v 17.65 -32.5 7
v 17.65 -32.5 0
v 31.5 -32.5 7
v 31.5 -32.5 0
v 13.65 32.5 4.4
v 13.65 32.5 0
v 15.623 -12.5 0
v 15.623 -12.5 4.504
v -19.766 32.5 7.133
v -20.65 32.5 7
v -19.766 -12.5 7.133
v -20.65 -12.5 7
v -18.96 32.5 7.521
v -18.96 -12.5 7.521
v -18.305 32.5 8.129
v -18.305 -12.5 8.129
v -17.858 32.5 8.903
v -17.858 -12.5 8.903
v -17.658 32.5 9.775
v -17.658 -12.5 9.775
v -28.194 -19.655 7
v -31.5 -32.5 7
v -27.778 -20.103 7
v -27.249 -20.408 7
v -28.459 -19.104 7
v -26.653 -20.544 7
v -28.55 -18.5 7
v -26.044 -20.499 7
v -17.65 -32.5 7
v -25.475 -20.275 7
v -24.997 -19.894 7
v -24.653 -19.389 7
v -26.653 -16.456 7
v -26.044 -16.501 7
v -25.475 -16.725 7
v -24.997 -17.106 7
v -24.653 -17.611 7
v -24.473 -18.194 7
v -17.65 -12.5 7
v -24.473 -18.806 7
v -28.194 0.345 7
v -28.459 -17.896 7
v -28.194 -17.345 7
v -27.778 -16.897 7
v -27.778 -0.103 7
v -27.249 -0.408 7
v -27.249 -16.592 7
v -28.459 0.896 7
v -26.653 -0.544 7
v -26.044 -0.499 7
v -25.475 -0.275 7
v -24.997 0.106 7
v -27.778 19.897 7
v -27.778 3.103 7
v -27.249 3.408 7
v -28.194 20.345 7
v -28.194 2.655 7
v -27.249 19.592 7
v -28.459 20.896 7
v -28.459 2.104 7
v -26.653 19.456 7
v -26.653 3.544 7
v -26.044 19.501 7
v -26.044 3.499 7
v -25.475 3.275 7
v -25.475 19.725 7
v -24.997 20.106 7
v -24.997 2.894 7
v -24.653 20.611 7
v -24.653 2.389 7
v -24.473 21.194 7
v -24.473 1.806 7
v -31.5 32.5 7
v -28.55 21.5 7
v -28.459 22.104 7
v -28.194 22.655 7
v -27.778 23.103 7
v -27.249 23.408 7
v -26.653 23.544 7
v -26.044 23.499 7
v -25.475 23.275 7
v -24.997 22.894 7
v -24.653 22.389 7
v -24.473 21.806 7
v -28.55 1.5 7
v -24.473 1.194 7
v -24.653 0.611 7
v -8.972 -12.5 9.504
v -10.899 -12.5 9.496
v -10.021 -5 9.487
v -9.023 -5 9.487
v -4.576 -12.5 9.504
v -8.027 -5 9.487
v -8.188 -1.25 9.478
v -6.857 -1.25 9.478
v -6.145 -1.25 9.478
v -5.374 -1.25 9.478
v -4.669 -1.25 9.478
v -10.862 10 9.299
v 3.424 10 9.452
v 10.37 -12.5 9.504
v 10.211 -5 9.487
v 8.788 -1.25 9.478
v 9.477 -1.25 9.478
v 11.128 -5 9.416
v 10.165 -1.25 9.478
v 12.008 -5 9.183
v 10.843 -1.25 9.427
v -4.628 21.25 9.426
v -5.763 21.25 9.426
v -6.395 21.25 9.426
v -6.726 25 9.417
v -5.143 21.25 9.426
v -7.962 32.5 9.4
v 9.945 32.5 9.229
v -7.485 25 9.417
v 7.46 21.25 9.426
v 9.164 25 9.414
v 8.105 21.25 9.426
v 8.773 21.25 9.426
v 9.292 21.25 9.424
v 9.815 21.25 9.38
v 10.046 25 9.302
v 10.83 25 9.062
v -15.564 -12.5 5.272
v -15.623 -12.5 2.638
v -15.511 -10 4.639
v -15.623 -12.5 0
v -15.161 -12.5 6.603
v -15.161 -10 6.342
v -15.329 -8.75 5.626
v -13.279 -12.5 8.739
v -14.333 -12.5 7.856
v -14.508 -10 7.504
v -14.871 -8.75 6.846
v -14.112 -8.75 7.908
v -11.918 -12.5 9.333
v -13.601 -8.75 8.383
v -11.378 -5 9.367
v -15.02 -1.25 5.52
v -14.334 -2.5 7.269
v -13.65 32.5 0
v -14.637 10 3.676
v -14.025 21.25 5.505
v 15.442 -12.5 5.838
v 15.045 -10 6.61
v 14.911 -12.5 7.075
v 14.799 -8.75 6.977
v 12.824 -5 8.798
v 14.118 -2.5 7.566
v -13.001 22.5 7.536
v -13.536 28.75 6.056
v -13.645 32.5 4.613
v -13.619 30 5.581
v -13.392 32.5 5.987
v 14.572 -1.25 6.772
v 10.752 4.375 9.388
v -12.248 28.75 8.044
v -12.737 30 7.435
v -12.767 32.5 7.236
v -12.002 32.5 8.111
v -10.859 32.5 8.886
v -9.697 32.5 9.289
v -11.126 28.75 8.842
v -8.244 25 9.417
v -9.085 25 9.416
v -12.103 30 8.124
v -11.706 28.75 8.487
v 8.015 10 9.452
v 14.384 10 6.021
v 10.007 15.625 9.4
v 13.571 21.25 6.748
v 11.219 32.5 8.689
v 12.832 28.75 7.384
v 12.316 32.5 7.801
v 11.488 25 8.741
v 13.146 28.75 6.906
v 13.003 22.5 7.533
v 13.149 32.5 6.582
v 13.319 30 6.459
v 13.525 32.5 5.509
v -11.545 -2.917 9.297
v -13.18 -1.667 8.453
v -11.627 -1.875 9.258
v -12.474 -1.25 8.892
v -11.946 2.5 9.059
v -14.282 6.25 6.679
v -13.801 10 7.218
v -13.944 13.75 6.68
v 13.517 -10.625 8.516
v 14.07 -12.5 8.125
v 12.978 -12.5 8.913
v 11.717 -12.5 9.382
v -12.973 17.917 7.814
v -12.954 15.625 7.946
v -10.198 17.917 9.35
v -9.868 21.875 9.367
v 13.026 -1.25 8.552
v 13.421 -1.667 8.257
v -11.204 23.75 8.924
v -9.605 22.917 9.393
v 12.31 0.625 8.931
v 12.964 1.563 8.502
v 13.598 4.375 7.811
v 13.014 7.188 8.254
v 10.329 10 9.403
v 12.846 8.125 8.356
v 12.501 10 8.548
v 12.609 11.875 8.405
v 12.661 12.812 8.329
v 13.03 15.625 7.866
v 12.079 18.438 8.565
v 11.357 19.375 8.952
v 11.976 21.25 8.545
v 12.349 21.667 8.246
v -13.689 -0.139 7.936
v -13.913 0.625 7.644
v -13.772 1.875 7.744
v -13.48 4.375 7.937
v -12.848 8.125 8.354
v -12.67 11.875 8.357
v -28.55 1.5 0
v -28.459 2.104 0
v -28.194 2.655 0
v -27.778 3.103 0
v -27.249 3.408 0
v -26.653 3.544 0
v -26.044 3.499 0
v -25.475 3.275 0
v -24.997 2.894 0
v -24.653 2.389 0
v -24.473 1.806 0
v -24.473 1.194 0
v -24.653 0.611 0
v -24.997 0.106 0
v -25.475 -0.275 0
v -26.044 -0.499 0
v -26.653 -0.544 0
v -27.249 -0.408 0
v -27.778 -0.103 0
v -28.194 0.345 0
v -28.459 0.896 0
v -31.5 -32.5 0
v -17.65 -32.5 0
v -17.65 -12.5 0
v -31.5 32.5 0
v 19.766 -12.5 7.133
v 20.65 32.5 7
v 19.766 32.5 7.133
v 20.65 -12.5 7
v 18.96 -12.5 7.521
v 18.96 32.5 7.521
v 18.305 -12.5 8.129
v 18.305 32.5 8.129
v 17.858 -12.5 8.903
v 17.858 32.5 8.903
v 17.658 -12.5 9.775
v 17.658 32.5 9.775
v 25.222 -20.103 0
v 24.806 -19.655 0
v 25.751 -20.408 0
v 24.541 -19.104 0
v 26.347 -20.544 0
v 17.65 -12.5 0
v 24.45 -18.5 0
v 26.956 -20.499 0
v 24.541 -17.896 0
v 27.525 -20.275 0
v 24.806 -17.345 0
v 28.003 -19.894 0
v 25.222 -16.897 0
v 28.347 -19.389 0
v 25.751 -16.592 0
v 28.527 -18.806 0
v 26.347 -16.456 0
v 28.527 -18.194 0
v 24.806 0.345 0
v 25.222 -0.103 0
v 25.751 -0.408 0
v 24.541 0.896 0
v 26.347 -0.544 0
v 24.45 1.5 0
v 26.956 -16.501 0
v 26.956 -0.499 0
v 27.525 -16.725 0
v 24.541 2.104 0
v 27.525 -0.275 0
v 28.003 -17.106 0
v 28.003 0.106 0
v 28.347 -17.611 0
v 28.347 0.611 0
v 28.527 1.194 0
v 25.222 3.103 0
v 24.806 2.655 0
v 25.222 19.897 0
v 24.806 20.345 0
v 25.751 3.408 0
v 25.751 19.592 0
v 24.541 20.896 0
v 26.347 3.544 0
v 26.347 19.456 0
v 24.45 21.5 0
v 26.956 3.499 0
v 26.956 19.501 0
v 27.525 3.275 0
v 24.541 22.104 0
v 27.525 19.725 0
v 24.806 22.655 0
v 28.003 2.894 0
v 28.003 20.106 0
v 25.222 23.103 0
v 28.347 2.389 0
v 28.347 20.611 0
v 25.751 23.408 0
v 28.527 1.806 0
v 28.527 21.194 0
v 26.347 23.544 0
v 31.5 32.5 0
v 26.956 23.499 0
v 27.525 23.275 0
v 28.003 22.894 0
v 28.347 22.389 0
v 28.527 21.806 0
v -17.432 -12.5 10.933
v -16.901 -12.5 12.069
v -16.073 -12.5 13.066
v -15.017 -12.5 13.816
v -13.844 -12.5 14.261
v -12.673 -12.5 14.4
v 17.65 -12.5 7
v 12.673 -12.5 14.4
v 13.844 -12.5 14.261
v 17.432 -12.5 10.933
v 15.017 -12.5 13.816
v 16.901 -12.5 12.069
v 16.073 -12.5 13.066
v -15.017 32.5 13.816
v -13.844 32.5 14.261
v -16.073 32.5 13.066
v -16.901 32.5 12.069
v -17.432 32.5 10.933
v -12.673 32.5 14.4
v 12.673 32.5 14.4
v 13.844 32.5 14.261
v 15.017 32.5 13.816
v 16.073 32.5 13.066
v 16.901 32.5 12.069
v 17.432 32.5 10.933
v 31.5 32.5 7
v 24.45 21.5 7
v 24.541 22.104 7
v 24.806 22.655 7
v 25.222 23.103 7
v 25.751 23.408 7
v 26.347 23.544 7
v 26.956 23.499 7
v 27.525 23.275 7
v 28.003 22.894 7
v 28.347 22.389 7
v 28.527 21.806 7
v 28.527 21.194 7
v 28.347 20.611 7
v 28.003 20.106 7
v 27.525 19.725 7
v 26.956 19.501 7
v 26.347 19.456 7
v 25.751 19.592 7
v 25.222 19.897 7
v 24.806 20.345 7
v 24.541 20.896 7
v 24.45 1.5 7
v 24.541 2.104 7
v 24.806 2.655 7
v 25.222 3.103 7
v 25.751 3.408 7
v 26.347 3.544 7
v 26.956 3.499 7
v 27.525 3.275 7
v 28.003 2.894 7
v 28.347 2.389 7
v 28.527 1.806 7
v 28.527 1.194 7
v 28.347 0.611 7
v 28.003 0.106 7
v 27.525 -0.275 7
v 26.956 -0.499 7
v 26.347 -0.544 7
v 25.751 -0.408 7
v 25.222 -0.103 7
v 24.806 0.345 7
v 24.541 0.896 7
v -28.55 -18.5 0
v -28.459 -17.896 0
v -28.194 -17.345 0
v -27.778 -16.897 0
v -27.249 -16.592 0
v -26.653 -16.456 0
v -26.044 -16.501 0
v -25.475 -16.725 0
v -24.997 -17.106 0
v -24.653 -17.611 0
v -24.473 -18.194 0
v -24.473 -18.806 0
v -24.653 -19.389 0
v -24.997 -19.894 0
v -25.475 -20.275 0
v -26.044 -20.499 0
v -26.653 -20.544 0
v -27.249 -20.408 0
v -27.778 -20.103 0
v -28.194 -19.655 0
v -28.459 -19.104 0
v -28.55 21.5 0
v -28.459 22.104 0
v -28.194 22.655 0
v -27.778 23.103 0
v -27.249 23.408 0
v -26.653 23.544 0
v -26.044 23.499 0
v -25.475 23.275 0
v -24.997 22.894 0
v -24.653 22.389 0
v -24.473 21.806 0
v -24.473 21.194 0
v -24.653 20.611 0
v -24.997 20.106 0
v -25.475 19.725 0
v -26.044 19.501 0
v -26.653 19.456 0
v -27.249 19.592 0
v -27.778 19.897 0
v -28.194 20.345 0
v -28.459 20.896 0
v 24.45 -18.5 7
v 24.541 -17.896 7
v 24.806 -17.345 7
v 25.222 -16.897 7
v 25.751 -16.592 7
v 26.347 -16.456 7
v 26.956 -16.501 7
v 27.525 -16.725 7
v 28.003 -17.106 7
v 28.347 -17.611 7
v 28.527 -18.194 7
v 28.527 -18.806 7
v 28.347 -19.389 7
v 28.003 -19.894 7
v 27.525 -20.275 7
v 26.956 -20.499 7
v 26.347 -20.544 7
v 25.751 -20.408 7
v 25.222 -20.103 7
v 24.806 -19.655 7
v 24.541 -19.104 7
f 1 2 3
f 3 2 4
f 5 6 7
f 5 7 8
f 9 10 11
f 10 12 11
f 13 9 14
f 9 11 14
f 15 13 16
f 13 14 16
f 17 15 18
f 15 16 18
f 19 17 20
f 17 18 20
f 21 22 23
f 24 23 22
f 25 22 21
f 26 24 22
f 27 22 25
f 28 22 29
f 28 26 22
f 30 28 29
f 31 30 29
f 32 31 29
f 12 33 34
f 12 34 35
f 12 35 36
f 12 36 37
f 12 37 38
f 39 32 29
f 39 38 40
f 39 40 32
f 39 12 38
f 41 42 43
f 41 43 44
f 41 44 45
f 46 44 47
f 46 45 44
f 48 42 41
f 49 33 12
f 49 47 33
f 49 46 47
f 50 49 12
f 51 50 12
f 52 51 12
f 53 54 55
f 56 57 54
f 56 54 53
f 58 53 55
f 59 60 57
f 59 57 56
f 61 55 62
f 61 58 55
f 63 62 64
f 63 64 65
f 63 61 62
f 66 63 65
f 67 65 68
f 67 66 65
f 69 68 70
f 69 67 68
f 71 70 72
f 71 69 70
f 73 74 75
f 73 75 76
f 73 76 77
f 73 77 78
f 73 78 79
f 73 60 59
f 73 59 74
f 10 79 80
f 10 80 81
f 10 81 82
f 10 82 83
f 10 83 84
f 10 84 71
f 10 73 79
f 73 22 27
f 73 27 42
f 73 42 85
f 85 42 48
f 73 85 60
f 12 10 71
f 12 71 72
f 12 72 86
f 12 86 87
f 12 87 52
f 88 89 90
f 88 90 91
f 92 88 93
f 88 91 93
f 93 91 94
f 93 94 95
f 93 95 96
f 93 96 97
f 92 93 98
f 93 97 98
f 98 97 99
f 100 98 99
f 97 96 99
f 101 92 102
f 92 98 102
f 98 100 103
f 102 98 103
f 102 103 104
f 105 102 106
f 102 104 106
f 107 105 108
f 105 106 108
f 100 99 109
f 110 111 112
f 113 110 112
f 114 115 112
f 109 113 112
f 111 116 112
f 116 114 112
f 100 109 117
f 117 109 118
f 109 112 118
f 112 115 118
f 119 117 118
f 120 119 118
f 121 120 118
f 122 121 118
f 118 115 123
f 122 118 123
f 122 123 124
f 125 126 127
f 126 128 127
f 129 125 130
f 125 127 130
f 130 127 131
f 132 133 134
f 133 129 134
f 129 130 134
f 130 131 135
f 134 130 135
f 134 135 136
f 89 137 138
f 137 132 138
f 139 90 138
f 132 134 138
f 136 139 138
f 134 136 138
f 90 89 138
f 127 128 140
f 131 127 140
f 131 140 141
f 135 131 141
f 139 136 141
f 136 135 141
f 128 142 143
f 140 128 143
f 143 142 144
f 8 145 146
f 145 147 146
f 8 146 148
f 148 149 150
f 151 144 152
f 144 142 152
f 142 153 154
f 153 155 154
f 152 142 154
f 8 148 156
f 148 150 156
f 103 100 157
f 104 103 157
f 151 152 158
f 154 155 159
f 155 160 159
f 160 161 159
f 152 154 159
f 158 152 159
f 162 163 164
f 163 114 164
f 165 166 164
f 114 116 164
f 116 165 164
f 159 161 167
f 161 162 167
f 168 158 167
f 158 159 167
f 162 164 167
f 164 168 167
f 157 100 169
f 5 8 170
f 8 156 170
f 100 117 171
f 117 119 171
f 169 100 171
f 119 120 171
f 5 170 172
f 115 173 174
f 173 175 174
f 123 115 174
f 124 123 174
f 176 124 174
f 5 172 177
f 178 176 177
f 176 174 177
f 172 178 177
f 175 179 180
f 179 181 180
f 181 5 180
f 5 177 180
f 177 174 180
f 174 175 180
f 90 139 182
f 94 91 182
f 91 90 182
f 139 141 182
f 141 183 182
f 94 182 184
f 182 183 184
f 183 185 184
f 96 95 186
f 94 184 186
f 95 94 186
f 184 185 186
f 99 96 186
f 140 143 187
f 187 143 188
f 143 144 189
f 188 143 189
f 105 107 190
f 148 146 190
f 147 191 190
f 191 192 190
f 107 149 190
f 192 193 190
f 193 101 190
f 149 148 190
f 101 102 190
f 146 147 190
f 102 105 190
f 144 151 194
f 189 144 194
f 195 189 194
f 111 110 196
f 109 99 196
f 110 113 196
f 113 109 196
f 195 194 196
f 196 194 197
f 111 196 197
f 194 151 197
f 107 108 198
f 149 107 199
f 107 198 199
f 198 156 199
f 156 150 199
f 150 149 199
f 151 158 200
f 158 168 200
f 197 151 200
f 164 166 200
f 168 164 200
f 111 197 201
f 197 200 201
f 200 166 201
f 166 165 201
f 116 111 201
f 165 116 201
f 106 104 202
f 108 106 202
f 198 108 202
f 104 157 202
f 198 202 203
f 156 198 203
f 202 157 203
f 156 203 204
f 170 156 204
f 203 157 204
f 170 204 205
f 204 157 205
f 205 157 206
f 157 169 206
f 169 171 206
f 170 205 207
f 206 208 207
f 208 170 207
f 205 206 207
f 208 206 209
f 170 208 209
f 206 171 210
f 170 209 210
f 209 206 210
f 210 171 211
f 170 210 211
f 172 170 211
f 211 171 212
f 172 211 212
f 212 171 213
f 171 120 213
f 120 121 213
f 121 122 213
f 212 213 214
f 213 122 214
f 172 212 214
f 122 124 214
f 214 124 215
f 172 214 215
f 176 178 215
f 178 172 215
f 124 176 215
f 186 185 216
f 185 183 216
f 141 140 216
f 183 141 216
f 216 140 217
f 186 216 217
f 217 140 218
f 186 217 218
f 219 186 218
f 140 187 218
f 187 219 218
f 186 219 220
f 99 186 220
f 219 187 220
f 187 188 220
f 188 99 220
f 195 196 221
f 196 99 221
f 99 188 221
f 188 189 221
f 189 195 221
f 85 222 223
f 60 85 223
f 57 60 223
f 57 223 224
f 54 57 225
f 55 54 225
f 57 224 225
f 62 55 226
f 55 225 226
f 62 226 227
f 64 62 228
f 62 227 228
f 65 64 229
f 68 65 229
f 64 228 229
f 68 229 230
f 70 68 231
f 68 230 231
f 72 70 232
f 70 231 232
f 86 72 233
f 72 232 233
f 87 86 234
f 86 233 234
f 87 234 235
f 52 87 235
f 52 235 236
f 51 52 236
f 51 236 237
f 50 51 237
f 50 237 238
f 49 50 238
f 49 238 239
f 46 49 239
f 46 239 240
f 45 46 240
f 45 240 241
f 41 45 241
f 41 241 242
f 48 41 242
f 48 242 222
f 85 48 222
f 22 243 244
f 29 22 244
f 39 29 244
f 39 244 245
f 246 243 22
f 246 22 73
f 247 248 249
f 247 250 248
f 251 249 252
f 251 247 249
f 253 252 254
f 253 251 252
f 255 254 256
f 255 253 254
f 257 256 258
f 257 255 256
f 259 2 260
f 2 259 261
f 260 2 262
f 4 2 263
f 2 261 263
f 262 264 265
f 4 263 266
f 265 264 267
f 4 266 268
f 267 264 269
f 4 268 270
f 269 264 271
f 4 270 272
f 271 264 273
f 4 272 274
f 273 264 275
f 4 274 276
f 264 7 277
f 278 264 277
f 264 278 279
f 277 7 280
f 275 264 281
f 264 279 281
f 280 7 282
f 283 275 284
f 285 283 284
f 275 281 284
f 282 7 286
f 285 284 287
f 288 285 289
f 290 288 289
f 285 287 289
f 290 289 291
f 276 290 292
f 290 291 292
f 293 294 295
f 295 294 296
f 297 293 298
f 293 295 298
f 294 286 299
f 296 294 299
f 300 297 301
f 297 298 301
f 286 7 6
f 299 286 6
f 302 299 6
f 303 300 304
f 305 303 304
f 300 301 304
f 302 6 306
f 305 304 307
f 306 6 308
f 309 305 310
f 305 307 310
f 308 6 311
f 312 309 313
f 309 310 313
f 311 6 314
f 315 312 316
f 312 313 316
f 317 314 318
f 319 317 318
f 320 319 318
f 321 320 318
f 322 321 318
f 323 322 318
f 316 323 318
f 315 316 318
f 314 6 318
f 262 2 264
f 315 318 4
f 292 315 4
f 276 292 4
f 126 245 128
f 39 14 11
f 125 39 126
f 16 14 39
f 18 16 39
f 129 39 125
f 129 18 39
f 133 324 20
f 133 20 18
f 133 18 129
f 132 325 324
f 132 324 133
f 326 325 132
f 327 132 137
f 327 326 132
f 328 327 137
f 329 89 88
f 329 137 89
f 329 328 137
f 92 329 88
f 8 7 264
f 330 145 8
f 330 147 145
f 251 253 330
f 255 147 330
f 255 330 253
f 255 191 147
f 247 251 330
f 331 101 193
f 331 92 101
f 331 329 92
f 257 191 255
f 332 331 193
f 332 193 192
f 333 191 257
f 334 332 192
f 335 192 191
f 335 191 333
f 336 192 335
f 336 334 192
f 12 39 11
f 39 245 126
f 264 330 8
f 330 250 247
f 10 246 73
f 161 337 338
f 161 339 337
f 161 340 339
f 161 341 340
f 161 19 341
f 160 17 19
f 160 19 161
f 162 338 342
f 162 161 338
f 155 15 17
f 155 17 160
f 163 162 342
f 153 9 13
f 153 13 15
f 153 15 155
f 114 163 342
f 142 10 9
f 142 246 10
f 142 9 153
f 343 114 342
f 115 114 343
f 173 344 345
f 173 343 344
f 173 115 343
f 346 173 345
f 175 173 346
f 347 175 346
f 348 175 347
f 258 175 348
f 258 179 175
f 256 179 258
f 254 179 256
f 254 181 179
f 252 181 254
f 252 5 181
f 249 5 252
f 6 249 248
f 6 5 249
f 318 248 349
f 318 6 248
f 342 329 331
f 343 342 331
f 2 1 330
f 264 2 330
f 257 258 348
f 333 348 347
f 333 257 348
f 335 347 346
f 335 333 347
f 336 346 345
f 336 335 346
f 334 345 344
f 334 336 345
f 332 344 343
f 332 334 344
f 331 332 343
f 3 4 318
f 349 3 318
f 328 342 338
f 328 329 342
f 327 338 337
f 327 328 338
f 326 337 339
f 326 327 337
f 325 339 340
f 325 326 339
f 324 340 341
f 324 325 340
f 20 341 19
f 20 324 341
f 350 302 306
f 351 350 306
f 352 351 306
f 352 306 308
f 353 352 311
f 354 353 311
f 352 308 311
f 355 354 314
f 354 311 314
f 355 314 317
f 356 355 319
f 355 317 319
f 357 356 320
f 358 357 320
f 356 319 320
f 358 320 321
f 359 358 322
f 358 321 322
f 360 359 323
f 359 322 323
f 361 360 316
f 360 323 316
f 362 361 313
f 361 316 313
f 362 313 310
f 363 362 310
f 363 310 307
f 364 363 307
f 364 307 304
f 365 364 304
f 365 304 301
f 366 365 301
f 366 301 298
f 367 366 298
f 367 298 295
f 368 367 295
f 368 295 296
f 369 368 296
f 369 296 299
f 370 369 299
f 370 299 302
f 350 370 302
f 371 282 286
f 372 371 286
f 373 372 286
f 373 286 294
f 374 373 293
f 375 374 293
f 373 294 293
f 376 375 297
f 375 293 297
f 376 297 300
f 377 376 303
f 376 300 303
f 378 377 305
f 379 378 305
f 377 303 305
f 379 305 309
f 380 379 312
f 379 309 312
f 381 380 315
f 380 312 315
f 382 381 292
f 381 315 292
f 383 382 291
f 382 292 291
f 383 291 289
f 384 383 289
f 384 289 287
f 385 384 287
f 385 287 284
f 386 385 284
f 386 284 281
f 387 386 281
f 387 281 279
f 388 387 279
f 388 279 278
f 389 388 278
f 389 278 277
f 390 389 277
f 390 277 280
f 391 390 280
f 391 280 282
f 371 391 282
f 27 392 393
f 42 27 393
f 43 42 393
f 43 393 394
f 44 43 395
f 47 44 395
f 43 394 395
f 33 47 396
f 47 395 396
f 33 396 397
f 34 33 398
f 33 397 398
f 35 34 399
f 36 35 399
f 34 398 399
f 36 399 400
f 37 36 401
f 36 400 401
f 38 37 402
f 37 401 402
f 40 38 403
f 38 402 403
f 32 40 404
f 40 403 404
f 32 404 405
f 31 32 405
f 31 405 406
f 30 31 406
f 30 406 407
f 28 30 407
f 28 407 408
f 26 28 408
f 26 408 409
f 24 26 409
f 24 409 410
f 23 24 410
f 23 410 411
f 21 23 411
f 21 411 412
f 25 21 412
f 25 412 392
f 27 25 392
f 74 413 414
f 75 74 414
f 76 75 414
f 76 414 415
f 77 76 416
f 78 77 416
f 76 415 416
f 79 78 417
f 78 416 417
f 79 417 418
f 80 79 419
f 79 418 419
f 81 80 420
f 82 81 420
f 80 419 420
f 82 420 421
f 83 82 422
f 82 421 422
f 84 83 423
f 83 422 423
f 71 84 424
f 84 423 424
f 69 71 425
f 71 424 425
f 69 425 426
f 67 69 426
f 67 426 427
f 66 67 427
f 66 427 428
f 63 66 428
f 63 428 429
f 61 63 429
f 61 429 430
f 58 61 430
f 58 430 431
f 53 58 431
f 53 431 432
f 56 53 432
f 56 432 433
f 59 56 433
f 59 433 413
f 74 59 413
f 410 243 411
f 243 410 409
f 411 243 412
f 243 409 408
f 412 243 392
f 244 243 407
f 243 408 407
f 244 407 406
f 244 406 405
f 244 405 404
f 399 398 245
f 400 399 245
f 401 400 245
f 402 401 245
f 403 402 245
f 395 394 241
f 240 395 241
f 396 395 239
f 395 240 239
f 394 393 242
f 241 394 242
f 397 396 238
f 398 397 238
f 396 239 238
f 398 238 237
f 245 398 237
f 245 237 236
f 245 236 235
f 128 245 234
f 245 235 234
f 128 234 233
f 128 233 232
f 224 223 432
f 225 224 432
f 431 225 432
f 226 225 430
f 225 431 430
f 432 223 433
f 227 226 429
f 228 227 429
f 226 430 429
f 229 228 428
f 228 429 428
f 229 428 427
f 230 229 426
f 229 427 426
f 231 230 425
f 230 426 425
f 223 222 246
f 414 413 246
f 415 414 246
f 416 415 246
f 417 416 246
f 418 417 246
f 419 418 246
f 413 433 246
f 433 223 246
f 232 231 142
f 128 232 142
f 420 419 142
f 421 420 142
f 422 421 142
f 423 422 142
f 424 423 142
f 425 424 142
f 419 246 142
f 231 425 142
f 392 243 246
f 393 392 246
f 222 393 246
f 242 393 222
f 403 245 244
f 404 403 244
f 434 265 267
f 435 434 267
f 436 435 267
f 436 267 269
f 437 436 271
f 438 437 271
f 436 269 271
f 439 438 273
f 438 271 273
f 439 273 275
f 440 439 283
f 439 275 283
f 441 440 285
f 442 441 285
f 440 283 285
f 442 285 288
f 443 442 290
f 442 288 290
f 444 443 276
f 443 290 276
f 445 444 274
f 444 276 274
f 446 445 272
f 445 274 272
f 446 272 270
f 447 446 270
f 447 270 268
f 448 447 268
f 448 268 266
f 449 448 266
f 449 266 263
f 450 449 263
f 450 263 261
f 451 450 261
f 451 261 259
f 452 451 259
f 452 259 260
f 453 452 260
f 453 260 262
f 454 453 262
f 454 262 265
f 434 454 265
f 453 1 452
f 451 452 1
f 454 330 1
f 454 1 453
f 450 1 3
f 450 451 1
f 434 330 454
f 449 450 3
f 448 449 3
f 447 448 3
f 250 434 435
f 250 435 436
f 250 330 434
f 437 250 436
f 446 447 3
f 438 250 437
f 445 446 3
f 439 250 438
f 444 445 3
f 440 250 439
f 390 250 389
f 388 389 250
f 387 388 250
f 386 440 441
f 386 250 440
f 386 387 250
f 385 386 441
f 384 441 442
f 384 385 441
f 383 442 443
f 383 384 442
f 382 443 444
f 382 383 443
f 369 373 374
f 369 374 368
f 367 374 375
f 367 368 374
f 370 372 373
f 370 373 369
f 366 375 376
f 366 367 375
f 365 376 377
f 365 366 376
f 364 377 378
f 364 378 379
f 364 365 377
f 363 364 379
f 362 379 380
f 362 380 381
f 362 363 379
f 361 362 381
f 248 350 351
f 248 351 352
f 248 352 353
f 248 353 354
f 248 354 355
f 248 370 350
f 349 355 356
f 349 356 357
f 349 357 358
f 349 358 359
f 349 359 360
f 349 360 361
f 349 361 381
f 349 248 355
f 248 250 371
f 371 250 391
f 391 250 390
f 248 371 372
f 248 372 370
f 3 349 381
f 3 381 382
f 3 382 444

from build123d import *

# Parameters (mm, degrees)
SKETCH1_W           = 63
SKETCH1_H           = 65
BOSS_EXTRUDE1_DEPTH = 35
SKETCH4_W           = 13.85
SKETCH4_H           = 28
CUT_EXTRUDE1_DEPTH  = 81.26362829
SKETCH6_R           = 2.05
CUT_EXTRUDE2_DEPTH  = 35
SKETCH7_W           = 35.3
SKETCH7_H           = 20
CUT_EXTRUDE3_DEPTH  = 58.214508823
SKETCH5_W           = 43.787246082
SKETCH5_H           = 26.488580963
CUT_EXTRUDE4_DEPTH  = 81.26362829
FILLET1_R           = 3
FILLET2_R           = 5


with BuildPart() as part:
    # Sketch1 → Boss-Extrude1 (new body)
    with BuildSketch(Plane.XY):
        Rectangle(SKETCH1_W, SKETCH1_H)
    extrude(amount=BOSS_EXTRUDE1_DEPTH)

    # Cut-Loft1: read off the stored shape, not the designer's step
    # Cut-Loft1: loft between two sections, ruled curve by curve
    cut_loft1_from = [
        Edge.make_bspline([(-16.5, -32.5, -15.95), (-16.5, -32.5, -14.245344374), (-16.5, -32.5, -10.830534175), (-16.5, -32.5, -5.7), (-16.5, -32.5, -0.569465825), (-16.5, -32.5, 2.845344374), (-16.5, -32.5, 5.208176172), (-16.24079277, -32.5, 6.487165764), (-15.189486136, -32.5, 8.102764154), (-13.584460954, -32.5, 9.238586175), (-12.225257815, -32.5, 9.55), (-9.654092683, -32.5, 9.55), (-5.862169747, -32.5, 9.55), (0, -32.5, 9.55), (5.862169747, -32.5, 9.55), (9.654092683, -32.5, 9.55), (12.225257815, -32.5, 9.55), (13.584460954, -32.5, 9.238586175), (15.189486136, -32.5, 8.102764154), (16.24079277, -32.5, 6.487165764), (16.5, -32.5, 5.208176172), (16.5, -32.5, 4.55)], [0, 0, 0, 0, 0.090746911, 0.181493823, 0.272240734, 0.362987645, 0.362987645, 0.398025487, 0.43306333, 0.468101172, 0.503139015, 0.503139015, 0.592316419, 0.681493823, 0.770671227, 0.859848631, 0.859848631, 0.894886473, 0.929924315, 0.964962158, 1, 1, 1, 1], 3),
        Edge.make_line((16.5, -32.5, 0), (16.5, -32.5, 4.55)),
        Edge.make_line((16.5, -32.5, 0), (-16.5, -32.5, -15.95)),
    ]
    cut_loft1_to = [
        Edge.make_bspline([(-13.65, 32.5, -15.8), (-13.65, 32.5, -14.113380525), (-13.65, 32.5, -10.745084998), (-13.65, 32.5, -5.7), (-13.65, 32.5, -0.654915002), (-13.65, 32.5, 2.713380525), (-13.65, 32.5, 5.051212323), (-13.38927185, 32.5, 6.394463384), (-12.20097724, 32.5, 8.116532102), (-10.480556624, 32.5, 9.187425671), (-9.241272853, 32.5, 9.4), (-7.145107721, 32.5, 9.4), (-4.236047985, 32.5, 9.4), (0, 32.5, 9.4), (4.236047985, 32.5, 9.4), (7.145107721, 32.5, 9.4), (9.241272853, 32.5, 9.4), (10.480556624, 32.5, 9.187425671), (12.20097724, 32.5, 8.116532102), (13.38927185, 32.5, 6.394463384), (13.65, 32.5, 5.051212323), (13.65, 32.5, 4.4)], [0, 0, 0, 0, 0.090746911, 0.181493823, 0.272240734, 0.362987645, 0.362987645, 0.398025487, 0.43306333, 0.468101172, 0.503139015, 0.503139015, 0.592316419, 0.681493823, 0.770671227, 0.859848631, 0.859848631, 0.894886473, 0.929924315, 0.964962158, 1, 1, 1, 1], 3),
        Edge.make_line((13.65, 32.5, 0), (13.65, 32.5, 4.4)),
        Edge.make_line((13.65, 32.5, 0), (-13.65, 32.5, -15.8)),
    ]
    cut_loft1 = Solid(Shell([*[Face.make_surface_from_curves(cut_loft1_from[k], cut_loft1_to[k]) for k in range(3)], Face(Wire(cut_loft1_from)), Face(Wire(cut_loft1_to))]))
    add(cut_loft1, mode=Mode.SUBTRACT)

    # Sketch4 → Cut-Extrude1 (cut, through all)
    with BuildSketch(Plane(origin=(0, 32.5, 0), x_dir=(1, 0, 0), z_dir=(0, 1, 0))):
        with Locations((24.575, -21)):
            Rectangle(SKETCH4_W, SKETCH4_H)
        with Locations((-24.575, -21)):
            Rectangle(SKETCH4_W, SKETCH4_H)
    extrude(amount=-CUT_EXTRUDE1_DEPTH, mode=Mode.SUBTRACT)

    # Sketch6 → Cut-Extrude2 (cut)
    with BuildSketch(Plane(origin=(0, 0, 0), x_dir=(-1, 0, 0), z_dir=(0, 0, -1))):
        with Locations((-26.5, -18.5)):
            Circle(SKETCH6_R)
        with Locations((-26.5, 1.5)):
            Circle(SKETCH6_R)
        with Locations((-26.5, 21.5)):
            Circle(SKETCH6_R)
        with Locations((26.5, -18.5)):
            Circle(SKETCH6_R)
        with Locations((26.5, 1.5)):
            Circle(SKETCH6_R)
        with Locations((26.5, 21.5)):
            Circle(SKETCH6_R)
    extrude(amount=-CUT_EXTRUDE2_DEPTH, mode=Mode.SUBTRACT)

    # Sketch7 → Cut-Extrude3 (cut, through all)
    with BuildSketch(Plane.XY.offset(35)):
        with Locations((0, -22.5)):
            Rectangle(SKETCH7_W, SKETCH7_H)
    extrude(amount=-CUT_EXTRUDE3_DEPTH, mode=Mode.SUBTRACT)

    # Sketch5 → Cut-Extrude4 (cut, through all)
    with BuildSketch(Plane(origin=(0, 32.5, 0), x_dir=(1, 0, 0), z_dir=(0, 1, 0))):
        with Locations((-0.216233314, -27.644290482)):
            Rectangle(SKETCH5_W, SKETCH5_H)
    extrude(amount=-CUT_EXTRUDE4_DEPTH, mode=Mode.SUBTRACT)

    # Fillet1
    fillet1_edges = [part.edges().sort_by_distance(p)[0] for p in [
        (17.65, 10, 7),
        (-17.65, 10, 7),
    ]]
    fillet(fillet1_edges, radius=FILLET1_R)

    # Fillet2
    fillet2_edges = [part.edges().sort_by_distance(p)[0] for p in [
        (-17.65, 10, 14.4),
        (17.65, 10, 14.4),
    ]]
    fillet(fillet2_edges, radius=FILLET2_R)


solid = part.part
